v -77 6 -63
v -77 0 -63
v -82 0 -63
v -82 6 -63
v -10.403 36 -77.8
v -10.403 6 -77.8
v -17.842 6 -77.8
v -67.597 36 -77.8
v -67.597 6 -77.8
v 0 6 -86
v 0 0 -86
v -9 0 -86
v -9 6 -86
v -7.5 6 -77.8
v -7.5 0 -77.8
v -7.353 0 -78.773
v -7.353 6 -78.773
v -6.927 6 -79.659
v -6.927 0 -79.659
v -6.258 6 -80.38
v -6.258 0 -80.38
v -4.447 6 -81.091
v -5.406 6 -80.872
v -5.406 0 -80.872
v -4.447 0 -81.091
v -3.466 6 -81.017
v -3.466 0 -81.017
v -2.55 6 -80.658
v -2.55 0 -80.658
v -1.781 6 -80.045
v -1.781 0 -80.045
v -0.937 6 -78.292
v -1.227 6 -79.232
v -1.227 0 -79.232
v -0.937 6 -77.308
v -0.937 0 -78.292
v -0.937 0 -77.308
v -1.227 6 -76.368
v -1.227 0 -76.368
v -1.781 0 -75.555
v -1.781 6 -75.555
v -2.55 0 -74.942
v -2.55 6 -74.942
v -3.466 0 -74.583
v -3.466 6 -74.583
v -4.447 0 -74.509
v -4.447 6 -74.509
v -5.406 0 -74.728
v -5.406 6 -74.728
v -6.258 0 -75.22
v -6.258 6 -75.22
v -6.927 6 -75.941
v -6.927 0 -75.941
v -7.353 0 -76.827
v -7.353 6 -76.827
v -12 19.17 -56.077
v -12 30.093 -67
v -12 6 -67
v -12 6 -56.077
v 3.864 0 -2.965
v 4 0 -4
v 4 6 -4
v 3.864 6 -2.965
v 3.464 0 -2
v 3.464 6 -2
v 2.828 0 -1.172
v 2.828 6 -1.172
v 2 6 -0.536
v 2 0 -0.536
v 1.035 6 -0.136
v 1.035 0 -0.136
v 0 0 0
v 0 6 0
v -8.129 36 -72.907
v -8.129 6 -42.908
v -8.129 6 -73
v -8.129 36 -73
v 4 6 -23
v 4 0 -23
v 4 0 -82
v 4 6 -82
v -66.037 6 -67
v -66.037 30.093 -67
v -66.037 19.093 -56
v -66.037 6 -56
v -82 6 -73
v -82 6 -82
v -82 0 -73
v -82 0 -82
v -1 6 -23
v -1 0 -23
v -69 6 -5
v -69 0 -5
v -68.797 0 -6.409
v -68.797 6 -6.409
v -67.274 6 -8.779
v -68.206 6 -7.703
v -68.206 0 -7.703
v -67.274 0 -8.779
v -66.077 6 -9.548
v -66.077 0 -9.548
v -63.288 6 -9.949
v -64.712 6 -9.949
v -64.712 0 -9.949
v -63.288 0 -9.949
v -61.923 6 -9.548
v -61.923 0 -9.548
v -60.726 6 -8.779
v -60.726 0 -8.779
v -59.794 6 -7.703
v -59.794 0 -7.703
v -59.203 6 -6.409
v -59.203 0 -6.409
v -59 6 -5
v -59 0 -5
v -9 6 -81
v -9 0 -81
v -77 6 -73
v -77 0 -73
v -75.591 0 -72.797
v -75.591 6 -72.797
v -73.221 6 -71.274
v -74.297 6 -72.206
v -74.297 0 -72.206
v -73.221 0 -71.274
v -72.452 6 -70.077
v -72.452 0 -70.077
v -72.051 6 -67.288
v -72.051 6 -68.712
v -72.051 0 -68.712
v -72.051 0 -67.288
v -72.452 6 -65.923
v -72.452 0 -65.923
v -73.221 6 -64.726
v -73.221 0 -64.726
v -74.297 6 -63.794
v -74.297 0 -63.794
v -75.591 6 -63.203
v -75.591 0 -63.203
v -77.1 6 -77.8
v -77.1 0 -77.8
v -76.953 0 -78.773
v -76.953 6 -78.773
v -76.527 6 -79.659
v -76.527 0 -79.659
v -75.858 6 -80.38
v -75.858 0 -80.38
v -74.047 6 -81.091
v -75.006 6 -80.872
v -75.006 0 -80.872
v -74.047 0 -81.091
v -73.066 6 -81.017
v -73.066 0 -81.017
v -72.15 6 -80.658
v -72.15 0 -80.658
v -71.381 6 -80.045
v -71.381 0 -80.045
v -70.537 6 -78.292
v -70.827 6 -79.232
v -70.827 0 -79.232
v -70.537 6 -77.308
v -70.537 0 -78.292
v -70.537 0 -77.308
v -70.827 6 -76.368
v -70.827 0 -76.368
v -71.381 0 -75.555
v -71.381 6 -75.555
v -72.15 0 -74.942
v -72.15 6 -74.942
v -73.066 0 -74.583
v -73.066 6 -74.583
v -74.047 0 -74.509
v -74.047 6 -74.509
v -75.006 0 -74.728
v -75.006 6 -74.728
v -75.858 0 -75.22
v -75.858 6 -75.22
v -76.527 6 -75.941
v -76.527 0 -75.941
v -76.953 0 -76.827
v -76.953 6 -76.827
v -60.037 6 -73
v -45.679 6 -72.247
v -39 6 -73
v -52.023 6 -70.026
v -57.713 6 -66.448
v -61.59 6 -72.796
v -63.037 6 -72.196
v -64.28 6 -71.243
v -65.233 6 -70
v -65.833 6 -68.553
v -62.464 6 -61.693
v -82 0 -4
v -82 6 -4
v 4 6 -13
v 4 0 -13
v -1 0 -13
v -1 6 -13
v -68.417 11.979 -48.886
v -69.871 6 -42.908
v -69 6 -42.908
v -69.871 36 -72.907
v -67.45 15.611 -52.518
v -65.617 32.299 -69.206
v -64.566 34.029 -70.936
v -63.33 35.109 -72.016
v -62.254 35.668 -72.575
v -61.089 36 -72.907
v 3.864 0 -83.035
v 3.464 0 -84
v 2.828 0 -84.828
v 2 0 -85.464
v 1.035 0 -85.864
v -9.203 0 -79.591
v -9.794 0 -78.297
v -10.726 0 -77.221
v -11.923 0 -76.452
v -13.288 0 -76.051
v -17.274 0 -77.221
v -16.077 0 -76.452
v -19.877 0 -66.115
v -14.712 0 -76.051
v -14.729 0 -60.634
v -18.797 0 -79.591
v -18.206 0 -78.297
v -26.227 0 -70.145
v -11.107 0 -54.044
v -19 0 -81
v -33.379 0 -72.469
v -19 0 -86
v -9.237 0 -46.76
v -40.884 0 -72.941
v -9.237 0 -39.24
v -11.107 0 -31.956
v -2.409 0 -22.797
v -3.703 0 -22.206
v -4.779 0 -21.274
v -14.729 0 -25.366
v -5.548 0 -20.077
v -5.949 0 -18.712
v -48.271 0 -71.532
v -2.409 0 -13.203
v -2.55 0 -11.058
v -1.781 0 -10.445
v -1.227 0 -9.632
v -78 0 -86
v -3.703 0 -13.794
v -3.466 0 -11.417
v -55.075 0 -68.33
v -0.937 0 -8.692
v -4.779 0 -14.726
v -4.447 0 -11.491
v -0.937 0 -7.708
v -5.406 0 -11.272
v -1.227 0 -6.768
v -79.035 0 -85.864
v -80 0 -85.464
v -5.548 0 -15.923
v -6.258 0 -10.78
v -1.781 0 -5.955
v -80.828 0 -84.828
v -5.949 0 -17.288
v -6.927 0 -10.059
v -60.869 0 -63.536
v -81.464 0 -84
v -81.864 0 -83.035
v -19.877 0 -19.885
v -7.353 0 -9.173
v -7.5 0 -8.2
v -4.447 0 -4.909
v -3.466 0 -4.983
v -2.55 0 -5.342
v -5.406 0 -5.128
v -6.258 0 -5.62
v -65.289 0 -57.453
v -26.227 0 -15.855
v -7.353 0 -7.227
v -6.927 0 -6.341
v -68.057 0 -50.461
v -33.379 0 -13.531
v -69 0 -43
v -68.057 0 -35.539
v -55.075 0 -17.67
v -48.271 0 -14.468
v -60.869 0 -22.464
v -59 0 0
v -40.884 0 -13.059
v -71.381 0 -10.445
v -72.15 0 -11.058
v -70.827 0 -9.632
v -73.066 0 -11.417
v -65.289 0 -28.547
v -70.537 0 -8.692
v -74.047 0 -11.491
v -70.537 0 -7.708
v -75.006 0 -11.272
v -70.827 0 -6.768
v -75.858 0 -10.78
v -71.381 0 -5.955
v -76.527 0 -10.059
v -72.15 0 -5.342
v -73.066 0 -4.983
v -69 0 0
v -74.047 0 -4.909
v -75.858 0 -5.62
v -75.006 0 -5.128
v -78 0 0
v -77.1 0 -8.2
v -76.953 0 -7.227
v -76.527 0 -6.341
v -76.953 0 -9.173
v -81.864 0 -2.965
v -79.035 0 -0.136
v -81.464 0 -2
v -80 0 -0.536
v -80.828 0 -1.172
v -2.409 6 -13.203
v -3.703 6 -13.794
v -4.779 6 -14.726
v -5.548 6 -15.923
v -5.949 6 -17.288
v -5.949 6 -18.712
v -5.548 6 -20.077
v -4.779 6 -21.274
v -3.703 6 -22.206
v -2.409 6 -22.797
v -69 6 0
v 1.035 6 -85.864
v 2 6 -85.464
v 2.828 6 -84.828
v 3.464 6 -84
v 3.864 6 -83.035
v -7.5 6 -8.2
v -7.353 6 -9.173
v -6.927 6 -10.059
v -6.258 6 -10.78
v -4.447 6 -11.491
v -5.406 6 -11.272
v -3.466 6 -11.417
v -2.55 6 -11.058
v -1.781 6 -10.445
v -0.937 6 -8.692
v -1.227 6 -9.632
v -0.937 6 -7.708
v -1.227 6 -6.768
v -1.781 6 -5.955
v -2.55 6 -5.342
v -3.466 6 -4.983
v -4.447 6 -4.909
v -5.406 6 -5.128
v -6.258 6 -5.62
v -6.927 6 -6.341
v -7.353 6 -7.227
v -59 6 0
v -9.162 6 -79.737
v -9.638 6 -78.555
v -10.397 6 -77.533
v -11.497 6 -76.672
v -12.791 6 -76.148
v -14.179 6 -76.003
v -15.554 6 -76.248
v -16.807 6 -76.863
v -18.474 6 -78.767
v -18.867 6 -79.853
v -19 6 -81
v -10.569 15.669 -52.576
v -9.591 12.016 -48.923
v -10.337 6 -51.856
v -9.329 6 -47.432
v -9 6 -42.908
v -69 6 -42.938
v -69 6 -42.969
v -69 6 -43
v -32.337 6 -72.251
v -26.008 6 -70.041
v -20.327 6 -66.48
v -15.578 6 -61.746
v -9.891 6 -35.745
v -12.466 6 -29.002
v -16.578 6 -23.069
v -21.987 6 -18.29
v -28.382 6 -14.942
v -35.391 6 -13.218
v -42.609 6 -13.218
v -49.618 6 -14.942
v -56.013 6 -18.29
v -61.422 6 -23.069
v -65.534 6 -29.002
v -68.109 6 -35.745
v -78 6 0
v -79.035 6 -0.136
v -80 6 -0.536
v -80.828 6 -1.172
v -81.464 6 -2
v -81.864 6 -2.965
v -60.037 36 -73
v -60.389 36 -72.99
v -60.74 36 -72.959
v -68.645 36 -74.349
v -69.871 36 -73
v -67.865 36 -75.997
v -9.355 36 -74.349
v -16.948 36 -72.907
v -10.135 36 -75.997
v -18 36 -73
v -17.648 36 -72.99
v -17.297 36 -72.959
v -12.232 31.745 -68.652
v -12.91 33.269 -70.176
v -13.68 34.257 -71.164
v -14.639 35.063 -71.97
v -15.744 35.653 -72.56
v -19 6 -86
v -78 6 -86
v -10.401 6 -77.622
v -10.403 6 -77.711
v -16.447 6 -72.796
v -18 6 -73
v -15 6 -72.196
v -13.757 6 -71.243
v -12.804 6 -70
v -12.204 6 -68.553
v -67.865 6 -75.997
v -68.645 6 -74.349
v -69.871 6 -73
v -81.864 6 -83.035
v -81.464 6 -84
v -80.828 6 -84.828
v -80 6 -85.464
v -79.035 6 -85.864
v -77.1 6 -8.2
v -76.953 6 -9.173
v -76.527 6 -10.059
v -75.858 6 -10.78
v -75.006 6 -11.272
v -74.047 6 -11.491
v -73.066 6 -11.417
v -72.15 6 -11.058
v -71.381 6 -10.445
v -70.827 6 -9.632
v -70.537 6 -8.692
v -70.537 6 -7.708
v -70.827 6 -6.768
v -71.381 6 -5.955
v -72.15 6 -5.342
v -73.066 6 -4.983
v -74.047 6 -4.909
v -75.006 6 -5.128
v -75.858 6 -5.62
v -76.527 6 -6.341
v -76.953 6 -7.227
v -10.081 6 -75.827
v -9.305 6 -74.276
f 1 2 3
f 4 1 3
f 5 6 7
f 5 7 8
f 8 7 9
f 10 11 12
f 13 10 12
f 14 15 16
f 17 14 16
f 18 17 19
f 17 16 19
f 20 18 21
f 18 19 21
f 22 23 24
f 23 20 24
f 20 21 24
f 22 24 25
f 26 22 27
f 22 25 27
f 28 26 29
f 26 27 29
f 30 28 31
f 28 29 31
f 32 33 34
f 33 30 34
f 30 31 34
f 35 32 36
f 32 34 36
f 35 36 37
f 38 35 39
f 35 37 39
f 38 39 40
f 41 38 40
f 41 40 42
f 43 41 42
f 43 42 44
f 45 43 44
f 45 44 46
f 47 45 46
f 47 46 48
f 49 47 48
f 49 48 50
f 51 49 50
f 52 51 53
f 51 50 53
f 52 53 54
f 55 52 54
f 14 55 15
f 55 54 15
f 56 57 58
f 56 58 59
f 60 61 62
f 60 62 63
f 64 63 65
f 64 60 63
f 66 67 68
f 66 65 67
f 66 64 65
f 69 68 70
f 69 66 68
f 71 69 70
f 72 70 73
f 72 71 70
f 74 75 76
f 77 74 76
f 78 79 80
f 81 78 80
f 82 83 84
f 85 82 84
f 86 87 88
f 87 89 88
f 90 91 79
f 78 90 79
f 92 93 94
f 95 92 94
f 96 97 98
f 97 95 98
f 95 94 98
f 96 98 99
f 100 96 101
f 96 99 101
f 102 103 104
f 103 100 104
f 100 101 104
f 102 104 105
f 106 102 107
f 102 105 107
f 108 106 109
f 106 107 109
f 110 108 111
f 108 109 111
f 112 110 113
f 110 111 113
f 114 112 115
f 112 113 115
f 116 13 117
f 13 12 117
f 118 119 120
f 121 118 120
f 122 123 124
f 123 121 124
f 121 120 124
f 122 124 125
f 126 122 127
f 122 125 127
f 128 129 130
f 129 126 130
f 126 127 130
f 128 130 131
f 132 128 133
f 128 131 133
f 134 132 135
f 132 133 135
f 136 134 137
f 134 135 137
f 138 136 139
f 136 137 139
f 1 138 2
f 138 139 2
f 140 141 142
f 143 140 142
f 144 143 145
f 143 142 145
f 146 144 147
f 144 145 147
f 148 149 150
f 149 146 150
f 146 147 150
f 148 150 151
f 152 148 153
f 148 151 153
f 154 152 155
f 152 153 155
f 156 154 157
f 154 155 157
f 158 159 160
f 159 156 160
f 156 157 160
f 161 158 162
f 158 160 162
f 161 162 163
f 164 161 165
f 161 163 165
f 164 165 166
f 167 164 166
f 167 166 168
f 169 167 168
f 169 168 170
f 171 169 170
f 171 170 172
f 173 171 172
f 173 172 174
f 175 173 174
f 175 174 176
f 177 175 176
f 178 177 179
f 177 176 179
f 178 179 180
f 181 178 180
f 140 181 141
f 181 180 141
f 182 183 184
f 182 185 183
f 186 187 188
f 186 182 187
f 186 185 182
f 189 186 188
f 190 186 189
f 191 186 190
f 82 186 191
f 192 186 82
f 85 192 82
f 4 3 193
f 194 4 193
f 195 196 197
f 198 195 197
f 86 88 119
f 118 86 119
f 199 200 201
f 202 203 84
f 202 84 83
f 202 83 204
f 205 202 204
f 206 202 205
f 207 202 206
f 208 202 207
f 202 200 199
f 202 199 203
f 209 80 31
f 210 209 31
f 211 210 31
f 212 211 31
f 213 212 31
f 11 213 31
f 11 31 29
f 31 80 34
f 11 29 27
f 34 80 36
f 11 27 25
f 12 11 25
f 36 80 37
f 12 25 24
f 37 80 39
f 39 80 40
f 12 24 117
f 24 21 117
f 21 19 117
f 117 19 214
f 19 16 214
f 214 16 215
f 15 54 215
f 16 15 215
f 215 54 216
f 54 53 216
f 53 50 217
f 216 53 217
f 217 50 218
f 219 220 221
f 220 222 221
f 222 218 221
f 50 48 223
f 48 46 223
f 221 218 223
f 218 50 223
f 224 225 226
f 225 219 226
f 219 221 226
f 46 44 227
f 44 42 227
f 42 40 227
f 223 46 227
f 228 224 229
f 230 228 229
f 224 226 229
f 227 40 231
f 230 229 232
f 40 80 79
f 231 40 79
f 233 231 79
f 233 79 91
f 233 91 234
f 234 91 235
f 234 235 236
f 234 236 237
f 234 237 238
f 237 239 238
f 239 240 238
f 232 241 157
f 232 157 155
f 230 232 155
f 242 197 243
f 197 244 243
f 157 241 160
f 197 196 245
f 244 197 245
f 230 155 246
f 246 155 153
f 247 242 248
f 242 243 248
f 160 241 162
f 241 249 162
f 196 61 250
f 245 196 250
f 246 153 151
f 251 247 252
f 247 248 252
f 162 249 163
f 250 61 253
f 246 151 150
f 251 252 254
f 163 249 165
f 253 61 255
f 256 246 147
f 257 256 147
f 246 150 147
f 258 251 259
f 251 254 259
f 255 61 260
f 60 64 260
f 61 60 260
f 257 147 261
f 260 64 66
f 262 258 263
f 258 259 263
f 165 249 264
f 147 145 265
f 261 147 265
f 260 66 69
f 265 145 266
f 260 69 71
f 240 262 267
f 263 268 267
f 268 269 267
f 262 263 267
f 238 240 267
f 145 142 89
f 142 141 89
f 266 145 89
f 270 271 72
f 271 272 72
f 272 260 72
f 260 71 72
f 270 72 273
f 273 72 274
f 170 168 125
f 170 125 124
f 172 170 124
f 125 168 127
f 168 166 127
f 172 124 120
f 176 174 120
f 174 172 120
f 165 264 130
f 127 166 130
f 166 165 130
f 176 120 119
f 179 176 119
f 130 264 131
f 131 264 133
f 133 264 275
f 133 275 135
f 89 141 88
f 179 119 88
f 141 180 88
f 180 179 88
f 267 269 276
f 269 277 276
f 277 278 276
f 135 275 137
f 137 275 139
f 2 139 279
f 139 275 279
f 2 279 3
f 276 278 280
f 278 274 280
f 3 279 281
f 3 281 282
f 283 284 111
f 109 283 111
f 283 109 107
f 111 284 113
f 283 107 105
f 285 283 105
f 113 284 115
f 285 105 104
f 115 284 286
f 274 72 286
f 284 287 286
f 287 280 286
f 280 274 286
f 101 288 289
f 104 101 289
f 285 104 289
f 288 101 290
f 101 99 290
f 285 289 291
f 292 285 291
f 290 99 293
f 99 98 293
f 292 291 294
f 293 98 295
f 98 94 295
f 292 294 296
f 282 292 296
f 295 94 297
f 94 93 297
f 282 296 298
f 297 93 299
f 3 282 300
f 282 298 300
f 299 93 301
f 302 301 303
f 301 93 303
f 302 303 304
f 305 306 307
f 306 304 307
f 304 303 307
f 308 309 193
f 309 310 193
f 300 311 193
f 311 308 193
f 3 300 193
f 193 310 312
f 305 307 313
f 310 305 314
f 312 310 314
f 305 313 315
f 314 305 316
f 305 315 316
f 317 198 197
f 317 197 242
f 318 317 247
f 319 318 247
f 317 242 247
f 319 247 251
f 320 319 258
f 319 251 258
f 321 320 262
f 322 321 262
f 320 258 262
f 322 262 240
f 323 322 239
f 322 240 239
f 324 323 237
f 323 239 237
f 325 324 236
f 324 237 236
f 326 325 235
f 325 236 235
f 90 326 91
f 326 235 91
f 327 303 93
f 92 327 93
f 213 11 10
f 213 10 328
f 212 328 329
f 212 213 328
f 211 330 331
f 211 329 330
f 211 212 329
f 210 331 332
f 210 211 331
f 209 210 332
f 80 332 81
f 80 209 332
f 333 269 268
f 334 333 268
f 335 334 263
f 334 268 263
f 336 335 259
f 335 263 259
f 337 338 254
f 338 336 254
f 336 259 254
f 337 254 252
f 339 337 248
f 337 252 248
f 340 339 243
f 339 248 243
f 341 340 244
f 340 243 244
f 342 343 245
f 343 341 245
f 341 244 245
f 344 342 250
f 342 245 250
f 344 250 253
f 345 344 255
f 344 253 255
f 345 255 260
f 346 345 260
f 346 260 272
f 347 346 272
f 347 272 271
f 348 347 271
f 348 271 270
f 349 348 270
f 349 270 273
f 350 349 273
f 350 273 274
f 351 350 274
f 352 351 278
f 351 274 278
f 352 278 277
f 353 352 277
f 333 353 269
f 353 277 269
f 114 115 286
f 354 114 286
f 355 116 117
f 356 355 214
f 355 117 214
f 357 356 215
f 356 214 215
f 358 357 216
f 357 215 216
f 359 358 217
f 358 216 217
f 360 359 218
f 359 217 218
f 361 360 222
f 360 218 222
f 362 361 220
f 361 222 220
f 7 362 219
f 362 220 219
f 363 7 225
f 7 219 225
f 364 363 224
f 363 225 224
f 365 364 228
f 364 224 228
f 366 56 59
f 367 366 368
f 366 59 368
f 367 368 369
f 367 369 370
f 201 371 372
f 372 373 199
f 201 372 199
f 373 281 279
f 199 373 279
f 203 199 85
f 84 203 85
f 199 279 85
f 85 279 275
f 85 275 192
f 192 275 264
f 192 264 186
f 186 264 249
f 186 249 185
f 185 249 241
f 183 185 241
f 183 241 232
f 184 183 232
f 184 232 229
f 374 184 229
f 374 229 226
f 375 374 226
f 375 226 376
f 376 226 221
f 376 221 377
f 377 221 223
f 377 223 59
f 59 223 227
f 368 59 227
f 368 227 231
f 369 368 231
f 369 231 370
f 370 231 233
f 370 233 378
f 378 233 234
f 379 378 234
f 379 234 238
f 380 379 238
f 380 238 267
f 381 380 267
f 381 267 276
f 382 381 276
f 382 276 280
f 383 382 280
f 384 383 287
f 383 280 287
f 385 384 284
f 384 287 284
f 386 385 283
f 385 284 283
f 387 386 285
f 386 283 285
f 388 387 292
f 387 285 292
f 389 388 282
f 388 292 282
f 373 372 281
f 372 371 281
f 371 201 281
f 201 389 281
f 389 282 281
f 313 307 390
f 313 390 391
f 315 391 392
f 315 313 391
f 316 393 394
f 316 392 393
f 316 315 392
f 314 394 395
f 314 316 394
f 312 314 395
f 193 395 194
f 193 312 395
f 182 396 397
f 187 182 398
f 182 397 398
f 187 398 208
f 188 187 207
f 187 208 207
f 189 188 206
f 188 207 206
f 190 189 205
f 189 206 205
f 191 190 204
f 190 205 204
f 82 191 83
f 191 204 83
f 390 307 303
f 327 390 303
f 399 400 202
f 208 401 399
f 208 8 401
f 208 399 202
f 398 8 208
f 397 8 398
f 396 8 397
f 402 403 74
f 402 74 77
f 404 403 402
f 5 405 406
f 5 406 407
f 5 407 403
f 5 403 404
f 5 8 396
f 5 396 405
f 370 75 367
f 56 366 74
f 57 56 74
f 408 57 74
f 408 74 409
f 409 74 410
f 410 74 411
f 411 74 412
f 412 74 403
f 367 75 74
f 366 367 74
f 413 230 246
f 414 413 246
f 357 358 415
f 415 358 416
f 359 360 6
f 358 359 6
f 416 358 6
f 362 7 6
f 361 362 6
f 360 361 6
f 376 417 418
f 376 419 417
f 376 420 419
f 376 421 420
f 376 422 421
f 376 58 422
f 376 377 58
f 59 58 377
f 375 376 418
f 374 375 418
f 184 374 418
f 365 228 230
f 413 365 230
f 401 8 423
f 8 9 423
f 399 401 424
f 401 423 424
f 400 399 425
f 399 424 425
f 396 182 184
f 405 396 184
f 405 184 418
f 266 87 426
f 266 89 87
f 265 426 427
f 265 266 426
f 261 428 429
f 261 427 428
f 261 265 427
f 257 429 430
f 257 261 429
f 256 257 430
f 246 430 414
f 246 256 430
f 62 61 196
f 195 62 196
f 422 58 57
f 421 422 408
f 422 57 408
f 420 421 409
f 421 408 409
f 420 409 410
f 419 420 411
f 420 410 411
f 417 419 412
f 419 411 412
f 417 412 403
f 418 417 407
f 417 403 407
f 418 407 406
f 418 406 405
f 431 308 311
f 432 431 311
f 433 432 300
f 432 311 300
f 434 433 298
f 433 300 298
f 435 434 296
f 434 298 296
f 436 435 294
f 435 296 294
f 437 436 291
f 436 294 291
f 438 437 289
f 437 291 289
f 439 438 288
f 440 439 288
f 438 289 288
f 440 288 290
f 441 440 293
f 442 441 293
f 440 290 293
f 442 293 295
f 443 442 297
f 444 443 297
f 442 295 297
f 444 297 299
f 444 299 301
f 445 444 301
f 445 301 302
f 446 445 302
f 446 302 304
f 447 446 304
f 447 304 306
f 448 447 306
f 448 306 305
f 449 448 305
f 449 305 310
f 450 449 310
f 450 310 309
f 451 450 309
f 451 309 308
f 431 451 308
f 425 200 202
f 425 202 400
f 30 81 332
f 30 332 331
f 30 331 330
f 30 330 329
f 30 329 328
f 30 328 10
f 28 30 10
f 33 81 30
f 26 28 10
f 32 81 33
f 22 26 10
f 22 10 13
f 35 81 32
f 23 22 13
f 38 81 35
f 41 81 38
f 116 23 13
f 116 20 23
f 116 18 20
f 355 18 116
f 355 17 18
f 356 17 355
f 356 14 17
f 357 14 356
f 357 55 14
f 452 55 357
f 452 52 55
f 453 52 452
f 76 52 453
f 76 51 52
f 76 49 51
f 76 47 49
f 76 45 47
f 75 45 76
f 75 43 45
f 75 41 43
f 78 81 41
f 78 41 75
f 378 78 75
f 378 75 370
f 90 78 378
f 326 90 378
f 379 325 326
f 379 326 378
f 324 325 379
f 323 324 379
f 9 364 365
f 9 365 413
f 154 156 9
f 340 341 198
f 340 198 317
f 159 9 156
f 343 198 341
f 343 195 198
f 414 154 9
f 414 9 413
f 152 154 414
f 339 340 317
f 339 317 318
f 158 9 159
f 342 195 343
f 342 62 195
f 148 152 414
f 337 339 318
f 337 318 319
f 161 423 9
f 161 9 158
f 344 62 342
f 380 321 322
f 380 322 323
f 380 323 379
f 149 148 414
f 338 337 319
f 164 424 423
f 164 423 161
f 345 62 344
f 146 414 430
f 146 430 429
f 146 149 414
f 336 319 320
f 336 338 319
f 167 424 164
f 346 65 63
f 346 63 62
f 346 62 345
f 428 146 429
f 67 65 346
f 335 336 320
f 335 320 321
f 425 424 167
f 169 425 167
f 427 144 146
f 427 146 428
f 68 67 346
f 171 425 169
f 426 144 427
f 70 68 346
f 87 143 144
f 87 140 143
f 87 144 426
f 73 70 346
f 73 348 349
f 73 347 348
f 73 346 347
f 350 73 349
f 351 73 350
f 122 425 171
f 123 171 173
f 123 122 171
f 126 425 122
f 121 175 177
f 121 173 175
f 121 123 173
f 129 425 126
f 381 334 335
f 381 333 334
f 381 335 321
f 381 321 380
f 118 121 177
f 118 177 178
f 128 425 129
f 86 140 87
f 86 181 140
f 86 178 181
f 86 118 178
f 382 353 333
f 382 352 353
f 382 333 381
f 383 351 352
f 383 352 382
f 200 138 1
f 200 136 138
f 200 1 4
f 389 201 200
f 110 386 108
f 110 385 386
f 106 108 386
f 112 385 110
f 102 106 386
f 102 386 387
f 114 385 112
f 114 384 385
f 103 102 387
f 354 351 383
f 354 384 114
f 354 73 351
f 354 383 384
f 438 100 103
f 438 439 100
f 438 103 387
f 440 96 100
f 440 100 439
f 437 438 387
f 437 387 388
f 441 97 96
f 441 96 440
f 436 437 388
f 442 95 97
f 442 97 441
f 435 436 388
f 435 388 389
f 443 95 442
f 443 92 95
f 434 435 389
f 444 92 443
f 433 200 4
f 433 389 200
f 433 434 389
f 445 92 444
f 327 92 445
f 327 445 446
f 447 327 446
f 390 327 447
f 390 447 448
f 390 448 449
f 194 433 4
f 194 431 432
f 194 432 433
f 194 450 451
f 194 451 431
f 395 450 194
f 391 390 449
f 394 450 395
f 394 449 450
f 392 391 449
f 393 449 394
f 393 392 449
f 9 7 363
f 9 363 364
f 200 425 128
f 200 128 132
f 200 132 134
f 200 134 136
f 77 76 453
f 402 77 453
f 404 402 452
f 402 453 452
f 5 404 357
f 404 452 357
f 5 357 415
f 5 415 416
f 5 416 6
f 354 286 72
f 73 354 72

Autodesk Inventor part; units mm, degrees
ref_plane "YZ Plane" through (0, 0, 0) normal (1, 0, 0) x (0, 1, 0)
ref_plane "XZ Plane" through (0, 0, 0) normal (0, 1, 0) x (-1, 0, 0)
ref_plane "XY Plane" through (0, 0, 0) normal (0, 0, 1) x (1, 0, 0)
sketch "Эскиз1" plane through (0, 0, 0) normal (0, 1, 0) x (-1, 0, 0)
  arc A0 (82, -4) -> (78, 0) centre (78, -4) ccw
  line L0 (82, -63) -> (82, -4)
  line L1 (-4, -23) -> (-4, -82)
  line L2 (1, -23) -> (-4, -23)
  arc A1 (1, -23) -> (6, -18) centre (1, -18) ccw
  arc A2 (6, -18) -> (1, -13) centre (1, -18) ccw
  circle A3 centre (39, -43) radius 30
  line L3 (-4, -13) -> (1, -13)
  line L4 (-4, -4) -> (-4, -13)
  arc A4 (0, 0) -> (-4, -4) centre (0, -4) ccw
  line L5 (59, 0) -> (0, 0)
  line L6 (59, -5) -> (59, 0)
  line L7 (78, 0) -> (69, 0)
  arc A5 (59, -5) -> (69, -5) centre (64, -5) ccw
  line L8 (69, 0) -> (69, -5)
  arc A6 (77.1, -8.2) -> (70.5, -8.2) centre (73.8, -8.2) ccw
  circle A7 centre (73.8, -8.2) radius 3.3
  circle A8 centre (4.2, -8.2) radius 3.3
  circle A9 centre (73.8, -77.8) radius 3.3
  circle A10 centre (4.2, -77.8) radius 3.3
  arc A11 (19, -81) -> (9, -81) centre (14, -81) ccw
  line L9 (19, -81) -> (19, -86)
  line L10 (9, -86) -> (9, -81)
  line L11 (0, -86) -> (9, -86)
  arc A12 (-4, -82) -> (0, -86) centre (0, -82) ccw
  line L12 (19, -86) -> (78, -86)
  arc A13 (78, -86) -> (82, -82) centre (78, -82) ccw
  line L13 (82, -82) -> (82, -73)
  line L14 (82, -73) -> (77, -73)
  arc A14 (77, -63) -> (77, -73) centre (77, -68) ccw
  line L15 (77, -63) -> (82, -63)
  point P0 (0, 0)
extrude "Выдавливание1" add sketch "Эскиз1" along normal blind 6
sketch "Эскиз2" plane through (0, 6, 0) normal (0, 1, 0) x (1, 0, 0)
  line L0 (4, 23) -> (4, 82) projected
  line L1 (-82, 85.8) -> (4, 85.8)
  line L2 (4, 85.8) -> (4, 77.8)
  line L3 (4, 77.8) -> (-82, 77.8)
  line L4 (-82, 77.8) -> (-82, 85.8)
  circle A0 centre (-73.8, 77.8) radius 3.3 projected
  circle A1 centre (-4.2, 77.8) radius 3.3 projected
  circle A2 centre (-4.2, 77.8) radius 6.2032
  circle A3 centre (-73.8, 77.8) radius 6.2032
  line L5 (-82, 73) -> (-77, 73) projected
  line L6 (-82, 73) -> (4, 73)
  line L7 (4, 73) -> (4, 77.8)
  line L8 (4, 77.8) -> (-82, 77.8)
  line L9 (-82, 77.8) -> (-82, 73)
  line L10 (-8.1294, 73) -> (-12, 73)
  line L11 (-12, 73) -> (-12, 42.9076)
  line L12 (-12, 42.9076) -> (-8.1294, 42.9076)
  line L13 (-8.1294, 42.9076) -> (-8.1294, 73)
  line L14 (-69.8706, 73) -> (-66.037, 73)
  line L15 (-66.037, 73) -> (-66.037, 42.9076)
  line L16 (-66.037, 42.9076) -> (-69.8706, 42.9076)
  line L17 (-69.8706, 42.9076) -> (-69.8706, 73)
  circle A4 centre (-39, 43) radius 30 projected
  point P0 (0, 0)
  point P1 (-80.0032, 77.8)
  point P2 (-67.5968, 77.8)
  point P3 (-10.4032, 77.8)
  point P4 (2.0032, 77.8)
  point P5 (-12, 56.0767)
  point P6 (-9.0001, 42.9076)
  point P7 (-68.9999, 42.9076)
  point P8 (-66.037, 56)
  dimension "d4" = 4.8
  dimension "d5" = 8
extrude "Выдавливание3" add sketch "Эскиз2" along normal blind 30 contours L6 A3 L3 A2 | L13 L12 A4 L11 L6 | L6 L15 A4 L16 L17
chamfer "Фаска1" distance 30 angle 45 2 edges at (-69.4352, 36, -42.9076) (-8.5648, 36, -42.9076)
fillet "Сопряжение1" radius 6 2 edges at (-66.037, 21, -73) (-12, 21, -73)
properties part number "MotorCrepper2"
